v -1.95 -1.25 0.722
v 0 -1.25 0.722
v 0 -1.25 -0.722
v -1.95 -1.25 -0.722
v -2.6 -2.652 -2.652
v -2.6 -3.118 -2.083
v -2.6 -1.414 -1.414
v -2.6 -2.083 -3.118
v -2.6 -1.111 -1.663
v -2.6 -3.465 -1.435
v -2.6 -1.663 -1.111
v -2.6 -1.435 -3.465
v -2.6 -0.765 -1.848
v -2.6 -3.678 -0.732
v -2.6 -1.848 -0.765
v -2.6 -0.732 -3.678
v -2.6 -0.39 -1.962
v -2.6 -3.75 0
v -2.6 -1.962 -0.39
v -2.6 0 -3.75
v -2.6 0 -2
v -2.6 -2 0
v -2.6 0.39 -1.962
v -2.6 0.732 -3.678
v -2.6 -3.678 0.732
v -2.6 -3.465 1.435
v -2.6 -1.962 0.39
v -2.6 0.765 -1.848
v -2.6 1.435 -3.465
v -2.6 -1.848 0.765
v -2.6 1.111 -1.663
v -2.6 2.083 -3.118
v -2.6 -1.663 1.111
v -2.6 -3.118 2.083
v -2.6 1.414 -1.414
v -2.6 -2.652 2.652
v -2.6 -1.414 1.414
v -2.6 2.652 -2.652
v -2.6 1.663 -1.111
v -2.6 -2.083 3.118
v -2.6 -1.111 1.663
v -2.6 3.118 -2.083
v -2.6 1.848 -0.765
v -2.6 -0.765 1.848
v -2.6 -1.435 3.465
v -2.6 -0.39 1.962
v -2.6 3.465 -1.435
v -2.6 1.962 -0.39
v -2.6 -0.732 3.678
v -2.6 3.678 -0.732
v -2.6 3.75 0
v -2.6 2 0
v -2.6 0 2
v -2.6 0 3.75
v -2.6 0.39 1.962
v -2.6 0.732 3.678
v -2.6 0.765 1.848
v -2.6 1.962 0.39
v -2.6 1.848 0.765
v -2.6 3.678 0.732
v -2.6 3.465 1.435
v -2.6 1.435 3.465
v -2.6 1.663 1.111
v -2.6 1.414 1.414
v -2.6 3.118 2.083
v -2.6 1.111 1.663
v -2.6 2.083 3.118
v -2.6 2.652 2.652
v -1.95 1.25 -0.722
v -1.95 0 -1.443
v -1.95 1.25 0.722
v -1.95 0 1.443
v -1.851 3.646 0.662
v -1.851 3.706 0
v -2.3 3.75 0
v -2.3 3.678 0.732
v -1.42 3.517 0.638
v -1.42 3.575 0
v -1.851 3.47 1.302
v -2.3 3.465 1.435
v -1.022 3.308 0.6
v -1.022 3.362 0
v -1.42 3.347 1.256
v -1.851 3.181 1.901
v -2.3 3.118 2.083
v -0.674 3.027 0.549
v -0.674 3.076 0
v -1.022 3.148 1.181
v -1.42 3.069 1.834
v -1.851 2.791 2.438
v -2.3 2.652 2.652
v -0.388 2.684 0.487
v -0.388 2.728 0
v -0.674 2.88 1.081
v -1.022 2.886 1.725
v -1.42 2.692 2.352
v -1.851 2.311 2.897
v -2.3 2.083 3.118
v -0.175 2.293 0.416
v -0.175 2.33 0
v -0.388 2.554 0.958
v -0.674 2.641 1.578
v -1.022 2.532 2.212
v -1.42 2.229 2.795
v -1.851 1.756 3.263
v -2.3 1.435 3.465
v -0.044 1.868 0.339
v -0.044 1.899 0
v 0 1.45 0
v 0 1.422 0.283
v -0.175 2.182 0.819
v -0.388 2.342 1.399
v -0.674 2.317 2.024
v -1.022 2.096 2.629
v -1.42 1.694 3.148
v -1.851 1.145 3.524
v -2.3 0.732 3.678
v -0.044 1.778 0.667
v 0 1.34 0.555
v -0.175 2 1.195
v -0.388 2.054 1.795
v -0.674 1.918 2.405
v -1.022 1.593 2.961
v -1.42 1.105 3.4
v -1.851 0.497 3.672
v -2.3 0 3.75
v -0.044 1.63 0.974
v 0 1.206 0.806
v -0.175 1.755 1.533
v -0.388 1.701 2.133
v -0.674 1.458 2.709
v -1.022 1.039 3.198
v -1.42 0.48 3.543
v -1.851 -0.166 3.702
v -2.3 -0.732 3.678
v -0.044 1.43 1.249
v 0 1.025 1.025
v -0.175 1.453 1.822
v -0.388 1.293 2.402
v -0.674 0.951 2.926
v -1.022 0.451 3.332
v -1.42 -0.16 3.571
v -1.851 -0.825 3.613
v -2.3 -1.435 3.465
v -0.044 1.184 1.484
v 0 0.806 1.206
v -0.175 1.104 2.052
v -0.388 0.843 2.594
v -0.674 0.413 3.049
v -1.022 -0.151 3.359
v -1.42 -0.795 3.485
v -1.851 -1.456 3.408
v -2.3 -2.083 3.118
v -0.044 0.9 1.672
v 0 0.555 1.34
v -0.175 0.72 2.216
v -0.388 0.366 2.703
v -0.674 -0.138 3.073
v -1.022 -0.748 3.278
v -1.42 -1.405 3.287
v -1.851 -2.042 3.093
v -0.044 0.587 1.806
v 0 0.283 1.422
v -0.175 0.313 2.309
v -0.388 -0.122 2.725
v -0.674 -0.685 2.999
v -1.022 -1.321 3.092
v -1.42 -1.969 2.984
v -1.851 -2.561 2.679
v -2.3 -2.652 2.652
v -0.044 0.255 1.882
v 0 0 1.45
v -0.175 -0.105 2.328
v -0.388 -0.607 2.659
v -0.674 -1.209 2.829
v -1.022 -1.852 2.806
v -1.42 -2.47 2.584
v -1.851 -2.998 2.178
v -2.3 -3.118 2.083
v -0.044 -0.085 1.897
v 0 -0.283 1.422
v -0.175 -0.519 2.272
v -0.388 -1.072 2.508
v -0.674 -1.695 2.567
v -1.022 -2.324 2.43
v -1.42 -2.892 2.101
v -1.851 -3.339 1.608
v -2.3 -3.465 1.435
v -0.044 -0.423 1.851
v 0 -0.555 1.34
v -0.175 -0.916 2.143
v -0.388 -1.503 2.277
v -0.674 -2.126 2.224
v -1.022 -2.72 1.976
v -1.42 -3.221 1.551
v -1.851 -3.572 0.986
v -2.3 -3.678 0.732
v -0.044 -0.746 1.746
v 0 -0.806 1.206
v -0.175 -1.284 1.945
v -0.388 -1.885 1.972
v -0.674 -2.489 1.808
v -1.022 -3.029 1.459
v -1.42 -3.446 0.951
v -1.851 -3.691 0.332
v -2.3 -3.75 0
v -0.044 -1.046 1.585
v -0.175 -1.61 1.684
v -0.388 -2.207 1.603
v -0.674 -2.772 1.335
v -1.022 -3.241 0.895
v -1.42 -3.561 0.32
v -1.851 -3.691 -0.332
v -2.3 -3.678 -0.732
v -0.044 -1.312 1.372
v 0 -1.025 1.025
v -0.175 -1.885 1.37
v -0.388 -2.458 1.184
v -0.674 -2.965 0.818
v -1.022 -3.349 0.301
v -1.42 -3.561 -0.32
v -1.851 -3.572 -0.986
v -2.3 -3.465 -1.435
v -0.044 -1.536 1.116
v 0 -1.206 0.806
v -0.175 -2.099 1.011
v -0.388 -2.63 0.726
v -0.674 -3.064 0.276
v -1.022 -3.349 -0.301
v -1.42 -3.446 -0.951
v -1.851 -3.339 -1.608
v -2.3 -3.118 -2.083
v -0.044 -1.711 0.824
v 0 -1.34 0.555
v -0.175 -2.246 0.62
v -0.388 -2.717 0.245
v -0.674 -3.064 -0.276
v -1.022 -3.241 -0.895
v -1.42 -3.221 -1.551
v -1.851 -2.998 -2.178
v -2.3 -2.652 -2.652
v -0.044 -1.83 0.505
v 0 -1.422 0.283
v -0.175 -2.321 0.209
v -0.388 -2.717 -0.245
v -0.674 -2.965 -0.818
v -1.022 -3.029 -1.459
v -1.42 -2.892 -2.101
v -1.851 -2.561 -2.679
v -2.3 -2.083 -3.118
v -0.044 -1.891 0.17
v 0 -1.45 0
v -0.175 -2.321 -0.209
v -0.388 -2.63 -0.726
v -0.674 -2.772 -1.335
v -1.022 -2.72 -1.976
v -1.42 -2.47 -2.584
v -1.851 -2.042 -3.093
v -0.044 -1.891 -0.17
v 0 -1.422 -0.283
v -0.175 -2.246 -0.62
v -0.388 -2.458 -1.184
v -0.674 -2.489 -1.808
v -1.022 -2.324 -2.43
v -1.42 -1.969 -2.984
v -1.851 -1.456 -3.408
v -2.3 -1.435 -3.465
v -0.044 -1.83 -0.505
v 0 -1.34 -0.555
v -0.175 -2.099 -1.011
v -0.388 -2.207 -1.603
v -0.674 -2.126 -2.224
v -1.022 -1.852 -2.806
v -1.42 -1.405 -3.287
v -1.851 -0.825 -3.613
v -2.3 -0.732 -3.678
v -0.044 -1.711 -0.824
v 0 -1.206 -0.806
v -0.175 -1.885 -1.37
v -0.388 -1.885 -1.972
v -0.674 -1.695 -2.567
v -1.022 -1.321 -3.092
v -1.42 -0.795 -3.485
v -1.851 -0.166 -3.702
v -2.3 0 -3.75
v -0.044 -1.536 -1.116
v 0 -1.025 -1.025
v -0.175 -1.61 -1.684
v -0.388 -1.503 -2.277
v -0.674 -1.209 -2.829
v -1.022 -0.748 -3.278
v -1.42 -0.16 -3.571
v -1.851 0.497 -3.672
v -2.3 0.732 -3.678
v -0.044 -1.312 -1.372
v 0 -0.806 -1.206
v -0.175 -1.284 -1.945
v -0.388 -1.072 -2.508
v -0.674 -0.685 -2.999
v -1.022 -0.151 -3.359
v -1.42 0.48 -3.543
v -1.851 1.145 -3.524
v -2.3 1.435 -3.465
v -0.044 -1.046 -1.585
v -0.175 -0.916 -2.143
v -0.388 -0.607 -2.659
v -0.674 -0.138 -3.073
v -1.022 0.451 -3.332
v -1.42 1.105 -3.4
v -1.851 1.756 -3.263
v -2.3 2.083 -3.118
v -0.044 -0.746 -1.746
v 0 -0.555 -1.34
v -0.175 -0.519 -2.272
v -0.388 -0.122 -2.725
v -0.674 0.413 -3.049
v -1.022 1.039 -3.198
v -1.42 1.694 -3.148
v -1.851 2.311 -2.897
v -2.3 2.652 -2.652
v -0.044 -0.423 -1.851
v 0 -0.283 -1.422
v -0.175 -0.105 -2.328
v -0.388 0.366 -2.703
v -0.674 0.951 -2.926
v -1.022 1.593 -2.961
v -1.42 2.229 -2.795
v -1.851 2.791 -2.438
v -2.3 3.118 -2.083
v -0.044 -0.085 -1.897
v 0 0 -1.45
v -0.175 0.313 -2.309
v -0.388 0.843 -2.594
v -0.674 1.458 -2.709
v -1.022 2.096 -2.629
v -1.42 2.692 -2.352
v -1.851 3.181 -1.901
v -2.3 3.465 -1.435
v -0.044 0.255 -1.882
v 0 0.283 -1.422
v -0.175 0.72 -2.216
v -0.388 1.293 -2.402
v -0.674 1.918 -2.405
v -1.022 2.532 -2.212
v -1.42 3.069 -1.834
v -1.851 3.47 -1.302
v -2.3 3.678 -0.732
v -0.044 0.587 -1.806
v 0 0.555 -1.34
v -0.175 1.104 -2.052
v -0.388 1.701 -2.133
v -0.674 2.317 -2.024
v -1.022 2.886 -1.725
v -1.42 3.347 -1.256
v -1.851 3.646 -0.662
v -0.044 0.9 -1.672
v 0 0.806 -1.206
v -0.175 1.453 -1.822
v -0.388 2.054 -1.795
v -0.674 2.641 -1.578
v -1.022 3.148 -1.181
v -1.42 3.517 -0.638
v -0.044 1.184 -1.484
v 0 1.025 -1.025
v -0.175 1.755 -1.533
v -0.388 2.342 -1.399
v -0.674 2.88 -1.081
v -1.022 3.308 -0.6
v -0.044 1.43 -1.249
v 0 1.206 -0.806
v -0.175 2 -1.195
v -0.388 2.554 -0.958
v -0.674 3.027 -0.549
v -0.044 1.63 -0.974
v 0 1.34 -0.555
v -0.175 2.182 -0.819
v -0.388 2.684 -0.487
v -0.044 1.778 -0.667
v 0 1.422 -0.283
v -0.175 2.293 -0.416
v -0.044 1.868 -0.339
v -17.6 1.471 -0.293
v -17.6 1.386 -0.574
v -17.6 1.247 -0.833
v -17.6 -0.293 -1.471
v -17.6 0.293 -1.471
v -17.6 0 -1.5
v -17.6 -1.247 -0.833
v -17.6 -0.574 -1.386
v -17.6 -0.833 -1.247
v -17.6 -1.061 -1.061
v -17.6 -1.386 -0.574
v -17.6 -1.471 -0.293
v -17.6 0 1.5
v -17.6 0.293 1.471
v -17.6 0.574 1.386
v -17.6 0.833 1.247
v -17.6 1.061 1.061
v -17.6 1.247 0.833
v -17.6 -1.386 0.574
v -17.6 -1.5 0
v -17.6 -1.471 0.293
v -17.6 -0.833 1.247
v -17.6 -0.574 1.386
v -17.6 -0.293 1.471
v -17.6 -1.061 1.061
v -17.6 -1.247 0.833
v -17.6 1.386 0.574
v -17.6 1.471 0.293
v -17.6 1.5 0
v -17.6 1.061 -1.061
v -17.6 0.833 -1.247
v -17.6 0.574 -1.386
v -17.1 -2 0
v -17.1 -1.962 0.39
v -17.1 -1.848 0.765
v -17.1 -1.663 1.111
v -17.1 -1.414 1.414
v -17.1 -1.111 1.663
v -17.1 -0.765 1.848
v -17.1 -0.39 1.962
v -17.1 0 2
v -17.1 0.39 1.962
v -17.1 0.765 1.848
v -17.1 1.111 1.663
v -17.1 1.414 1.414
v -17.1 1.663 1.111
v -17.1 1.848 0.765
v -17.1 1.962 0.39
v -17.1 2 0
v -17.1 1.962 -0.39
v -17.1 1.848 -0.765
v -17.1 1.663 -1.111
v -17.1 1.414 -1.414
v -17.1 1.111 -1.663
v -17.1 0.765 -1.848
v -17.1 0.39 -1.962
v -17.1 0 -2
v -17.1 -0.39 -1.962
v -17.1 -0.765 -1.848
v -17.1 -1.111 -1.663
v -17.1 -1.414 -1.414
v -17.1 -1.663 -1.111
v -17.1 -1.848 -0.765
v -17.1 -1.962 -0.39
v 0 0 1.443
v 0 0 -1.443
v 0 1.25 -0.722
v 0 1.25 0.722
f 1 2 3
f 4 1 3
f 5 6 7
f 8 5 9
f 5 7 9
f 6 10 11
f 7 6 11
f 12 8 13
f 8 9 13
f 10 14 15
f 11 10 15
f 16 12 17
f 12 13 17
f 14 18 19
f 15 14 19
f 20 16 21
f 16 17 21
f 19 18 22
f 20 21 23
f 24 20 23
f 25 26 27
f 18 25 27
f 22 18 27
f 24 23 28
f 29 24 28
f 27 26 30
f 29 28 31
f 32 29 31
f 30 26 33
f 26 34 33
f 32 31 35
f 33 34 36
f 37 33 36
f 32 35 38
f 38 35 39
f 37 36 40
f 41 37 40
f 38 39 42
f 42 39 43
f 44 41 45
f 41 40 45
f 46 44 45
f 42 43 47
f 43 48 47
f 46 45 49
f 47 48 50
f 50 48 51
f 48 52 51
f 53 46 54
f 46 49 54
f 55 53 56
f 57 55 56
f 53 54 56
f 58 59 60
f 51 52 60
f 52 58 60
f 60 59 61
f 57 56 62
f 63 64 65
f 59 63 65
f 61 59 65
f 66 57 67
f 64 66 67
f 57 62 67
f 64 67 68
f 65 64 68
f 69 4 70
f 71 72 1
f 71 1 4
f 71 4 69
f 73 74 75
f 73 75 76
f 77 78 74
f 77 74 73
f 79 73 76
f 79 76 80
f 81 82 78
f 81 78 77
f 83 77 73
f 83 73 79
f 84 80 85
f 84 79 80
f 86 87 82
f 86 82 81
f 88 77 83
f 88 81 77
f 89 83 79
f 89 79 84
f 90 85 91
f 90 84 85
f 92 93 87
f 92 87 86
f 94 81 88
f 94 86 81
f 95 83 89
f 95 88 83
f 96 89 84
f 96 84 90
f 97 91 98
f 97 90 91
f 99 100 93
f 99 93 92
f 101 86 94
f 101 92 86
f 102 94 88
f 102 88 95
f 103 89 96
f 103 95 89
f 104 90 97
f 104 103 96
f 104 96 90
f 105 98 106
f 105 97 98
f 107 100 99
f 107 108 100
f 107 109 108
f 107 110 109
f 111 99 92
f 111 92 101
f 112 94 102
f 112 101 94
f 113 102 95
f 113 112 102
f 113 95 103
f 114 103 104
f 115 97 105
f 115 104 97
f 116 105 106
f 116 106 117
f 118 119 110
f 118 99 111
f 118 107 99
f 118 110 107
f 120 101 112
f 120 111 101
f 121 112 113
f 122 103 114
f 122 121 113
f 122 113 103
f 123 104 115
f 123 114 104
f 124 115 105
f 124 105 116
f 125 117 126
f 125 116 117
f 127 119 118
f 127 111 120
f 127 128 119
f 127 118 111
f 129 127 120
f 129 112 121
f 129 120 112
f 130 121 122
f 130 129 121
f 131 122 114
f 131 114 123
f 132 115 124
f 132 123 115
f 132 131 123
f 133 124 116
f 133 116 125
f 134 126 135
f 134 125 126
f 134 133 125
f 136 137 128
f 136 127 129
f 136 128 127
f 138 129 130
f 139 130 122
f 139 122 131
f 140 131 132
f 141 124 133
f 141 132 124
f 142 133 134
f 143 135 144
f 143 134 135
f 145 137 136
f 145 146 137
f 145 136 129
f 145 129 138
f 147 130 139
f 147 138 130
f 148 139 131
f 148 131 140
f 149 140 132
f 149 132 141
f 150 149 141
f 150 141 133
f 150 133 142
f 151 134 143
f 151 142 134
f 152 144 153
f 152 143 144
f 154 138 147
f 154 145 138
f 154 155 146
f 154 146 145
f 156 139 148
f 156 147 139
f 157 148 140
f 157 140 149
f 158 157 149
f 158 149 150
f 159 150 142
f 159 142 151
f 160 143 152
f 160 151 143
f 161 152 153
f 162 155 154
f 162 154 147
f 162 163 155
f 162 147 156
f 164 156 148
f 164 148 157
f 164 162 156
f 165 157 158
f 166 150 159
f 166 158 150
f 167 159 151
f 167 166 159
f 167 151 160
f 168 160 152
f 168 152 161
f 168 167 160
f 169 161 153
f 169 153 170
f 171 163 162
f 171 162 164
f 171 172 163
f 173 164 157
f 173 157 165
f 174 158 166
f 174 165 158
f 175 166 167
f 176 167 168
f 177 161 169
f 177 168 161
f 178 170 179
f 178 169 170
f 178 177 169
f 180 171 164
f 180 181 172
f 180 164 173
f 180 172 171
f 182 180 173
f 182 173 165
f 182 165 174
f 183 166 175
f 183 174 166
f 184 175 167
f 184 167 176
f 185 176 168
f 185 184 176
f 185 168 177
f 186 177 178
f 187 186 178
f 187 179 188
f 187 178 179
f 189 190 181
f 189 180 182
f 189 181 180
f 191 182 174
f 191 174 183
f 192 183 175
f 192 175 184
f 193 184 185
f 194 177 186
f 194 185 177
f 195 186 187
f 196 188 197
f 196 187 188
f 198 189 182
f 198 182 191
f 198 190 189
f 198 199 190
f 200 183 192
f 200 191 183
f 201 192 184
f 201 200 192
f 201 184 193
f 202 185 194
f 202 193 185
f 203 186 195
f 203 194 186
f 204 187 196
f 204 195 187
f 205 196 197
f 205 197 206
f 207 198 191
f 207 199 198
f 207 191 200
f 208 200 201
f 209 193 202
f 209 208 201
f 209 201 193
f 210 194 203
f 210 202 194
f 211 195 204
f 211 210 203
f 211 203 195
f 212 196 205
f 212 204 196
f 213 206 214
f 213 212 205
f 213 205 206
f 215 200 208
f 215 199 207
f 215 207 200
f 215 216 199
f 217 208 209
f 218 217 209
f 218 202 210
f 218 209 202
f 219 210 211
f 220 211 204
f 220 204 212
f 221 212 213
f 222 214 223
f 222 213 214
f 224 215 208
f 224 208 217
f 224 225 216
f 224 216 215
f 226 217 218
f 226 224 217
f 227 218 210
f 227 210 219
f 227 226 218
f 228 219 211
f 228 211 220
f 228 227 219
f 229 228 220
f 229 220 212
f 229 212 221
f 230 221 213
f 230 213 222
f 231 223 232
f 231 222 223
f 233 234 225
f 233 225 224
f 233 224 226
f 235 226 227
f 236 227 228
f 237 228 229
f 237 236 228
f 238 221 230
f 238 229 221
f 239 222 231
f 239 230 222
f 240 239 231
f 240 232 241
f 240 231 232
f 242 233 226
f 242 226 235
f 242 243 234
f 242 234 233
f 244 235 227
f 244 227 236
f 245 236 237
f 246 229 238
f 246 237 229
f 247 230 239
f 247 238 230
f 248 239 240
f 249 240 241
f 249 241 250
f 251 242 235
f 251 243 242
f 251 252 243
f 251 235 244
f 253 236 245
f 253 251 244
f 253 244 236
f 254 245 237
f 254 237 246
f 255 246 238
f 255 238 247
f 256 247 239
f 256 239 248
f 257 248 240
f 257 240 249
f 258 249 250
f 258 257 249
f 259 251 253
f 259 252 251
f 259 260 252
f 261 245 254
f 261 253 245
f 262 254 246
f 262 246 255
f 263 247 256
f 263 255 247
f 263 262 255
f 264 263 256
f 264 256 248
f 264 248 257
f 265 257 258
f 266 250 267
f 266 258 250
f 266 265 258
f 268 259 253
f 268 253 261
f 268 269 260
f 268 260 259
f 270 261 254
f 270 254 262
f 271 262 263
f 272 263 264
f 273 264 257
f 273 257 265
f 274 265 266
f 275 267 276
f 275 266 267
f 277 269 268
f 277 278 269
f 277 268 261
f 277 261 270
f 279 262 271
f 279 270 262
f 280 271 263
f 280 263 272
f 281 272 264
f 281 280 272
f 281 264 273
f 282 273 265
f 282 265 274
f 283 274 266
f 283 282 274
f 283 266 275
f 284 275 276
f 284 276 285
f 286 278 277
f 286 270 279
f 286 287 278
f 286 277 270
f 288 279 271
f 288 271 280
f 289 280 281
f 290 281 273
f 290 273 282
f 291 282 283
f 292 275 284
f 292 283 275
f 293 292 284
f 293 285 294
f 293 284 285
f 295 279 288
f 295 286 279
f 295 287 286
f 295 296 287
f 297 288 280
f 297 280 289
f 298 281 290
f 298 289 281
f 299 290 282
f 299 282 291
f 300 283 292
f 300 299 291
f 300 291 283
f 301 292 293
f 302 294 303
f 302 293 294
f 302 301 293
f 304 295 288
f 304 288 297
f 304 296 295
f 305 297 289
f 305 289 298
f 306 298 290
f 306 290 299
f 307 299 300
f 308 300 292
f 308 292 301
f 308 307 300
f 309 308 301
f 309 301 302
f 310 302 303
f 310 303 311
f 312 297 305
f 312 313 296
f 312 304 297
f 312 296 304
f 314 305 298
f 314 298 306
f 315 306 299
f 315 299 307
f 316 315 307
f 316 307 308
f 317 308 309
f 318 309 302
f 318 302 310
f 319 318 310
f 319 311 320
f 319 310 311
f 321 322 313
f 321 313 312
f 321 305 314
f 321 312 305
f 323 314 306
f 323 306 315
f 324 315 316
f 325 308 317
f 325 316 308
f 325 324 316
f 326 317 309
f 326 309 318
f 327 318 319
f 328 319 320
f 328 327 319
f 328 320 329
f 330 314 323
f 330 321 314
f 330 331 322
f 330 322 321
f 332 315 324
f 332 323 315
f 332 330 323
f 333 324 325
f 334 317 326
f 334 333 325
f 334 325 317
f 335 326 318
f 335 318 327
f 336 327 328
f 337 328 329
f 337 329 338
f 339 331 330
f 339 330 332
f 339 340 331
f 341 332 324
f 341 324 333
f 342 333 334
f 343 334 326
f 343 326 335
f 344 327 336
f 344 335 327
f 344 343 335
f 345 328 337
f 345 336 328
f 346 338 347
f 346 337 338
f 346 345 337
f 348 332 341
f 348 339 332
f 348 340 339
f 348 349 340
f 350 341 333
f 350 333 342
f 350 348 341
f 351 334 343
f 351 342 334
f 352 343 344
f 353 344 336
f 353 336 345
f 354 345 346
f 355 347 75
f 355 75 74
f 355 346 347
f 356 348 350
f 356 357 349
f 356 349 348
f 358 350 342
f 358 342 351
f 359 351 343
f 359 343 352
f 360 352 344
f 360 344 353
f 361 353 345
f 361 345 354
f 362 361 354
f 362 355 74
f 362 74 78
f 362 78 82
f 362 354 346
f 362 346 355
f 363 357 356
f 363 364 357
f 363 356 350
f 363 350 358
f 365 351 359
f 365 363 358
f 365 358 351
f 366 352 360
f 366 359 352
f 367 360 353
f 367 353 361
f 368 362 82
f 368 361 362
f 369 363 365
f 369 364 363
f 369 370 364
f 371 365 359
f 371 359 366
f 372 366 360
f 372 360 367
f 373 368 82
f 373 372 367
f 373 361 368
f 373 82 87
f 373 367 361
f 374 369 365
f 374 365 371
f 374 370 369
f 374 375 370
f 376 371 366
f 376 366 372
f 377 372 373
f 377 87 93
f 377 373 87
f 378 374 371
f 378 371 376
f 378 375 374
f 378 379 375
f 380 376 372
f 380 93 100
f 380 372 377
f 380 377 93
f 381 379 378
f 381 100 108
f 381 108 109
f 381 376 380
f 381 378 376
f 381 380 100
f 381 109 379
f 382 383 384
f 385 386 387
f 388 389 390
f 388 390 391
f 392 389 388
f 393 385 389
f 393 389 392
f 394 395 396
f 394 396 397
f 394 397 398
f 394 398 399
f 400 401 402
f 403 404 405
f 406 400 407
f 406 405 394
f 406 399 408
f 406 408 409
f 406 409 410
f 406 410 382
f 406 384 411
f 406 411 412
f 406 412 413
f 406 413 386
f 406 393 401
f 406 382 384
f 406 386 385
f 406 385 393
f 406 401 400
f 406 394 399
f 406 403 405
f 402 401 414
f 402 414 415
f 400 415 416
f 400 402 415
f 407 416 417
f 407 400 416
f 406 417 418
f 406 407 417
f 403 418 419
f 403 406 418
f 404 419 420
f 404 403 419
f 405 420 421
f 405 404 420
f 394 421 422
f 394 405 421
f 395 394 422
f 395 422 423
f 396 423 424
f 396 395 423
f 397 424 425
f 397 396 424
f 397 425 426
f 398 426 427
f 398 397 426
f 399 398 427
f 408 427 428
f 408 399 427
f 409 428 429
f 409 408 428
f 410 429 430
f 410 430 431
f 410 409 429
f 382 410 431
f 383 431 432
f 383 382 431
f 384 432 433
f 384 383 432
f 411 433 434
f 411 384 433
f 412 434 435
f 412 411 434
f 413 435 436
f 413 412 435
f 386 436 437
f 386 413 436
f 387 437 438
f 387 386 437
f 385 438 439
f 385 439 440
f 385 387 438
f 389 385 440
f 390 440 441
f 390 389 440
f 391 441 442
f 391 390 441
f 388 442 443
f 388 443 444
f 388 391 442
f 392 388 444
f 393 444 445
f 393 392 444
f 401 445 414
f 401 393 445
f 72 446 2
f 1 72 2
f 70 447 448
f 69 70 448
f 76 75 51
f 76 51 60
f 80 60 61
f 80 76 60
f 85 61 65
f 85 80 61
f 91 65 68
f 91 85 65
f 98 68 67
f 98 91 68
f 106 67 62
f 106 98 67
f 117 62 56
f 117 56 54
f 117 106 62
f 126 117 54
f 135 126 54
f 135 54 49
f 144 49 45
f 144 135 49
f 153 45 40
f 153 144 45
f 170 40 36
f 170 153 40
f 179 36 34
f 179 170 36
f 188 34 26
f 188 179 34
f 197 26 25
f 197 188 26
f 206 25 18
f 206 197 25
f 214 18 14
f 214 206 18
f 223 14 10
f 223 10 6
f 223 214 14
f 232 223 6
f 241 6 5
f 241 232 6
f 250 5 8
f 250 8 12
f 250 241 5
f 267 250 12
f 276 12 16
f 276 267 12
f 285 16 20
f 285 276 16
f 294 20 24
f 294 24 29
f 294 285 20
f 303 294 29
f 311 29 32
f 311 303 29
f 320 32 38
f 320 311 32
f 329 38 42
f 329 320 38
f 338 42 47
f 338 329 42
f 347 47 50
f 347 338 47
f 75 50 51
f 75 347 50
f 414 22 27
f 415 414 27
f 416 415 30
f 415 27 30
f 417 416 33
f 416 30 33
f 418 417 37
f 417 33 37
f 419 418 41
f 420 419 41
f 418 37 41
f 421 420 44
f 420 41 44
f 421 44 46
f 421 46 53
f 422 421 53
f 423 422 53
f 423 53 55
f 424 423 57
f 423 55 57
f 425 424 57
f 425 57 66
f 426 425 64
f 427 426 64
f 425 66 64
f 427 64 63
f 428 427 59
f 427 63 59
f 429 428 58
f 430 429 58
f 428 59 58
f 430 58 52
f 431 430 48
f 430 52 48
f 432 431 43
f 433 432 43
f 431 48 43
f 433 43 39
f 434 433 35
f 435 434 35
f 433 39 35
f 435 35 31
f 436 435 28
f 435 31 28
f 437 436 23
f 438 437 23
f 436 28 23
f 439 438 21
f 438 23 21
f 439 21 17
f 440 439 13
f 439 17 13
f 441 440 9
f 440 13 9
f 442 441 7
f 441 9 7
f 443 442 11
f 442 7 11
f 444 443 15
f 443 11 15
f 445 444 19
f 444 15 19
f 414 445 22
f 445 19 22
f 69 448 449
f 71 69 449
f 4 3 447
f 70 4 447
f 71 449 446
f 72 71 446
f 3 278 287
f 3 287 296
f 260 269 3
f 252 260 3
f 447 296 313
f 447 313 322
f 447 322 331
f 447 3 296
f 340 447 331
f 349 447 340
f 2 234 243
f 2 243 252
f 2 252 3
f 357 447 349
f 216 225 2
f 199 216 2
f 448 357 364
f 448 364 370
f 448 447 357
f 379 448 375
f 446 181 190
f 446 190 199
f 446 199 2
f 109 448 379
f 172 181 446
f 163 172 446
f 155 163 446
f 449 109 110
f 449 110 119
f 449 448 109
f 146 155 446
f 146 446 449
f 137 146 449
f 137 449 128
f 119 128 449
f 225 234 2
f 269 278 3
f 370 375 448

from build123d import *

# Parameters (mm, degrees)
F0_R     = 3.75
F1_DEPTH = 2.6
F2_R     = 2
F3_DEPTH = 15
F4_SIZE  = 0.5
F6_DEPTH = 1.95
F7_R     = 2.3


with BuildPart() as f1:
    # F0 (on Right) → F1 (new body)
    with BuildSketch(Plane.YZ):
        Circle(F0_R)
    extrude(amount=-F1_DEPTH)

    # F2 (on face) → F3 (join)
    with BuildSketch(Plane(origin=(-2.6, 0, 0), x_dir=(0, -1, 0), z_dir=(-1, 0, 0))):
        Circle(F2_R)
    extrude(amount=F3_DEPTH)

    # F4
    f4_edges = [f1.edges().sort_by_distance(p)[0] for p in [
        (-17.6, 2, 0),
    ]]
    chamfer(f4_edges, length=F4_SIZE)

    # F5 (on face) → F6 (cut)
    with BuildSketch(Plane.YZ):
        Polygon((0, -1.443376), (1.25, -0.721688), (1.25, 0.721688), (0, 1.443376), (-1.25, 0.721688), (-1.25, -0.721688), align=None)
    extrude(amount=-F6_DEPTH, mode=Mode.SUBTRACT)

    # F7
    f7_edges = [f1.edges().sort_by_distance(p)[0] for p in [
        (0, -3.75, 0),
    ]]
    fillet(f7_edges, radius=F7_R)


solid = f1.part
